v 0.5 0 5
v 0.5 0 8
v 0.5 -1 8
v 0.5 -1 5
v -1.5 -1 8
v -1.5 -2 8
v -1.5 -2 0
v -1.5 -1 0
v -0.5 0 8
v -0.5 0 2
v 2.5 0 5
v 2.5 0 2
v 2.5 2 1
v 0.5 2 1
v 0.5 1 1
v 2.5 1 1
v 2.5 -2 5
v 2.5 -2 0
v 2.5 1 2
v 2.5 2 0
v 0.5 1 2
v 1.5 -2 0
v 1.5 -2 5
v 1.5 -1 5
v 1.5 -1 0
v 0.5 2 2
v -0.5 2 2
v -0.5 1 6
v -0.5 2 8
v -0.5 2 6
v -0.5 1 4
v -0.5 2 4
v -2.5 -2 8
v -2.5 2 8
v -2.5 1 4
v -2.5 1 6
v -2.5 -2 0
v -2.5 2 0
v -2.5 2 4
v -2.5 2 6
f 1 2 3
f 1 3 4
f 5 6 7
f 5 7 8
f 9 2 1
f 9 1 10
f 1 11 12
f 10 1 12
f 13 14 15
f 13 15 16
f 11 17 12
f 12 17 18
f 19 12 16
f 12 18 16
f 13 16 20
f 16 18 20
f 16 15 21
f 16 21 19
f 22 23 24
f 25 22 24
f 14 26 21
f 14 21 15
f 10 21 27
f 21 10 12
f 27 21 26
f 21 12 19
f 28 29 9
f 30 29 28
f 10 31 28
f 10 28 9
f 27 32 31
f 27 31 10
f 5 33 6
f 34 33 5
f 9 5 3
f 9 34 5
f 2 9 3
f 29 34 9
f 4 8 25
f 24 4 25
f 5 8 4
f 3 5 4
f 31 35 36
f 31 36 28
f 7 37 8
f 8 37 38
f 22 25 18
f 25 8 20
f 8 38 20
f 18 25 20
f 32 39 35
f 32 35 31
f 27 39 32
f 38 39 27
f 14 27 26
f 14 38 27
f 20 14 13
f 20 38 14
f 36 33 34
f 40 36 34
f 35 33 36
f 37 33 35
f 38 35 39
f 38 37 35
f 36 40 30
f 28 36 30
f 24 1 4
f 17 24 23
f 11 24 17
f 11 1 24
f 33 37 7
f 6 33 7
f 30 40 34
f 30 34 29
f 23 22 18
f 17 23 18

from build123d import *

# Parameters (mm, degrees)
SKETCH1_W           = 5
SKETCH1_H           = 4
BOSS_EXTRUDE1_DEPTH = 8
SKETCH2_W           = 2
SKETCH2_H           = 2
SKETCH2_H_2         = 1
CUT_EXTRUDE1_DEPTH  = 1
SKETCH4_W           = 6.112752517
SKETCH4_H           = 2
CUT_EXTRUDE2_DEPTH  = 3
SKETCH5_W           = 2
SKETCH5_H           = 3
CUT_EXTRUDE3_DEPTH  = 3
SKETCH6_W           = 3
SKETCH6_H           = 1
CUT_EXTRUDE5_DEPTH  = 9


with BuildPart() as part:
    # Sketch1 → Boss-Extrude1 (new body)
    with BuildSketch(Plane.XY):
        Rectangle(SKETCH1_W, SKETCH1_H)
    extrude(amount=BOSS_EXTRUDE1_DEPTH)

    # Sketch2 → Cut-Extrude1 (cut)
    with BuildSketch(Plane(origin=(0, 2, 0), x_dir=(1, 0, 0), z_dir=(0, 1, 0))):
        with Locations((-1.5, -5)):
            Rectangle(SKETCH2_W, SKETCH2_H)
        with Locations((1.5, -1.5)):
            Rectangle(SKETCH2_W, SKETCH2_H_2)
    extrude(amount=-CUT_EXTRUDE1_DEPTH, mode=Mode.SUBTRACT)

    # Sketch4 → Cut-Extrude2 (cut)
    with BuildSketch(Plane(origin=(2.5, 0, 0), x_dir=(0, 0, -1), z_dir=(1, 0, 0))):
        with Locations((-5.056376259, 1)):
            Rectangle(SKETCH4_W, SKETCH4_H)
    extrude(amount=-CUT_EXTRUDE2_DEPTH, mode=Mode.SUBTRACT)

    # Sketch5 → Cut-Extrude3 (cut)
    with BuildSketch(Plane(origin=(0, 0, 0), x_dir=(1, 0, 0), z_dir=(0, 1, 0))):
        with Locations((1.5, -6.5)):
            Rectangle(SKETCH5_W, SKETCH5_H)
    extrude(amount=-CUT_EXTRUDE3_DEPTH, mode=Mode.SUBTRACT)

    # Sketch6 → Cut-Extrude5 (cut, through all)
    with BuildSketch(Plane.XY.offset(8)):
        with Locations((0, -1.5)):
            Rectangle(SKETCH6_W, SKETCH6_H)
    extrude(amount=-CUT_EXTRUDE5_DEPTH, mode=Mode.SUBTRACT)


solid = part.part
